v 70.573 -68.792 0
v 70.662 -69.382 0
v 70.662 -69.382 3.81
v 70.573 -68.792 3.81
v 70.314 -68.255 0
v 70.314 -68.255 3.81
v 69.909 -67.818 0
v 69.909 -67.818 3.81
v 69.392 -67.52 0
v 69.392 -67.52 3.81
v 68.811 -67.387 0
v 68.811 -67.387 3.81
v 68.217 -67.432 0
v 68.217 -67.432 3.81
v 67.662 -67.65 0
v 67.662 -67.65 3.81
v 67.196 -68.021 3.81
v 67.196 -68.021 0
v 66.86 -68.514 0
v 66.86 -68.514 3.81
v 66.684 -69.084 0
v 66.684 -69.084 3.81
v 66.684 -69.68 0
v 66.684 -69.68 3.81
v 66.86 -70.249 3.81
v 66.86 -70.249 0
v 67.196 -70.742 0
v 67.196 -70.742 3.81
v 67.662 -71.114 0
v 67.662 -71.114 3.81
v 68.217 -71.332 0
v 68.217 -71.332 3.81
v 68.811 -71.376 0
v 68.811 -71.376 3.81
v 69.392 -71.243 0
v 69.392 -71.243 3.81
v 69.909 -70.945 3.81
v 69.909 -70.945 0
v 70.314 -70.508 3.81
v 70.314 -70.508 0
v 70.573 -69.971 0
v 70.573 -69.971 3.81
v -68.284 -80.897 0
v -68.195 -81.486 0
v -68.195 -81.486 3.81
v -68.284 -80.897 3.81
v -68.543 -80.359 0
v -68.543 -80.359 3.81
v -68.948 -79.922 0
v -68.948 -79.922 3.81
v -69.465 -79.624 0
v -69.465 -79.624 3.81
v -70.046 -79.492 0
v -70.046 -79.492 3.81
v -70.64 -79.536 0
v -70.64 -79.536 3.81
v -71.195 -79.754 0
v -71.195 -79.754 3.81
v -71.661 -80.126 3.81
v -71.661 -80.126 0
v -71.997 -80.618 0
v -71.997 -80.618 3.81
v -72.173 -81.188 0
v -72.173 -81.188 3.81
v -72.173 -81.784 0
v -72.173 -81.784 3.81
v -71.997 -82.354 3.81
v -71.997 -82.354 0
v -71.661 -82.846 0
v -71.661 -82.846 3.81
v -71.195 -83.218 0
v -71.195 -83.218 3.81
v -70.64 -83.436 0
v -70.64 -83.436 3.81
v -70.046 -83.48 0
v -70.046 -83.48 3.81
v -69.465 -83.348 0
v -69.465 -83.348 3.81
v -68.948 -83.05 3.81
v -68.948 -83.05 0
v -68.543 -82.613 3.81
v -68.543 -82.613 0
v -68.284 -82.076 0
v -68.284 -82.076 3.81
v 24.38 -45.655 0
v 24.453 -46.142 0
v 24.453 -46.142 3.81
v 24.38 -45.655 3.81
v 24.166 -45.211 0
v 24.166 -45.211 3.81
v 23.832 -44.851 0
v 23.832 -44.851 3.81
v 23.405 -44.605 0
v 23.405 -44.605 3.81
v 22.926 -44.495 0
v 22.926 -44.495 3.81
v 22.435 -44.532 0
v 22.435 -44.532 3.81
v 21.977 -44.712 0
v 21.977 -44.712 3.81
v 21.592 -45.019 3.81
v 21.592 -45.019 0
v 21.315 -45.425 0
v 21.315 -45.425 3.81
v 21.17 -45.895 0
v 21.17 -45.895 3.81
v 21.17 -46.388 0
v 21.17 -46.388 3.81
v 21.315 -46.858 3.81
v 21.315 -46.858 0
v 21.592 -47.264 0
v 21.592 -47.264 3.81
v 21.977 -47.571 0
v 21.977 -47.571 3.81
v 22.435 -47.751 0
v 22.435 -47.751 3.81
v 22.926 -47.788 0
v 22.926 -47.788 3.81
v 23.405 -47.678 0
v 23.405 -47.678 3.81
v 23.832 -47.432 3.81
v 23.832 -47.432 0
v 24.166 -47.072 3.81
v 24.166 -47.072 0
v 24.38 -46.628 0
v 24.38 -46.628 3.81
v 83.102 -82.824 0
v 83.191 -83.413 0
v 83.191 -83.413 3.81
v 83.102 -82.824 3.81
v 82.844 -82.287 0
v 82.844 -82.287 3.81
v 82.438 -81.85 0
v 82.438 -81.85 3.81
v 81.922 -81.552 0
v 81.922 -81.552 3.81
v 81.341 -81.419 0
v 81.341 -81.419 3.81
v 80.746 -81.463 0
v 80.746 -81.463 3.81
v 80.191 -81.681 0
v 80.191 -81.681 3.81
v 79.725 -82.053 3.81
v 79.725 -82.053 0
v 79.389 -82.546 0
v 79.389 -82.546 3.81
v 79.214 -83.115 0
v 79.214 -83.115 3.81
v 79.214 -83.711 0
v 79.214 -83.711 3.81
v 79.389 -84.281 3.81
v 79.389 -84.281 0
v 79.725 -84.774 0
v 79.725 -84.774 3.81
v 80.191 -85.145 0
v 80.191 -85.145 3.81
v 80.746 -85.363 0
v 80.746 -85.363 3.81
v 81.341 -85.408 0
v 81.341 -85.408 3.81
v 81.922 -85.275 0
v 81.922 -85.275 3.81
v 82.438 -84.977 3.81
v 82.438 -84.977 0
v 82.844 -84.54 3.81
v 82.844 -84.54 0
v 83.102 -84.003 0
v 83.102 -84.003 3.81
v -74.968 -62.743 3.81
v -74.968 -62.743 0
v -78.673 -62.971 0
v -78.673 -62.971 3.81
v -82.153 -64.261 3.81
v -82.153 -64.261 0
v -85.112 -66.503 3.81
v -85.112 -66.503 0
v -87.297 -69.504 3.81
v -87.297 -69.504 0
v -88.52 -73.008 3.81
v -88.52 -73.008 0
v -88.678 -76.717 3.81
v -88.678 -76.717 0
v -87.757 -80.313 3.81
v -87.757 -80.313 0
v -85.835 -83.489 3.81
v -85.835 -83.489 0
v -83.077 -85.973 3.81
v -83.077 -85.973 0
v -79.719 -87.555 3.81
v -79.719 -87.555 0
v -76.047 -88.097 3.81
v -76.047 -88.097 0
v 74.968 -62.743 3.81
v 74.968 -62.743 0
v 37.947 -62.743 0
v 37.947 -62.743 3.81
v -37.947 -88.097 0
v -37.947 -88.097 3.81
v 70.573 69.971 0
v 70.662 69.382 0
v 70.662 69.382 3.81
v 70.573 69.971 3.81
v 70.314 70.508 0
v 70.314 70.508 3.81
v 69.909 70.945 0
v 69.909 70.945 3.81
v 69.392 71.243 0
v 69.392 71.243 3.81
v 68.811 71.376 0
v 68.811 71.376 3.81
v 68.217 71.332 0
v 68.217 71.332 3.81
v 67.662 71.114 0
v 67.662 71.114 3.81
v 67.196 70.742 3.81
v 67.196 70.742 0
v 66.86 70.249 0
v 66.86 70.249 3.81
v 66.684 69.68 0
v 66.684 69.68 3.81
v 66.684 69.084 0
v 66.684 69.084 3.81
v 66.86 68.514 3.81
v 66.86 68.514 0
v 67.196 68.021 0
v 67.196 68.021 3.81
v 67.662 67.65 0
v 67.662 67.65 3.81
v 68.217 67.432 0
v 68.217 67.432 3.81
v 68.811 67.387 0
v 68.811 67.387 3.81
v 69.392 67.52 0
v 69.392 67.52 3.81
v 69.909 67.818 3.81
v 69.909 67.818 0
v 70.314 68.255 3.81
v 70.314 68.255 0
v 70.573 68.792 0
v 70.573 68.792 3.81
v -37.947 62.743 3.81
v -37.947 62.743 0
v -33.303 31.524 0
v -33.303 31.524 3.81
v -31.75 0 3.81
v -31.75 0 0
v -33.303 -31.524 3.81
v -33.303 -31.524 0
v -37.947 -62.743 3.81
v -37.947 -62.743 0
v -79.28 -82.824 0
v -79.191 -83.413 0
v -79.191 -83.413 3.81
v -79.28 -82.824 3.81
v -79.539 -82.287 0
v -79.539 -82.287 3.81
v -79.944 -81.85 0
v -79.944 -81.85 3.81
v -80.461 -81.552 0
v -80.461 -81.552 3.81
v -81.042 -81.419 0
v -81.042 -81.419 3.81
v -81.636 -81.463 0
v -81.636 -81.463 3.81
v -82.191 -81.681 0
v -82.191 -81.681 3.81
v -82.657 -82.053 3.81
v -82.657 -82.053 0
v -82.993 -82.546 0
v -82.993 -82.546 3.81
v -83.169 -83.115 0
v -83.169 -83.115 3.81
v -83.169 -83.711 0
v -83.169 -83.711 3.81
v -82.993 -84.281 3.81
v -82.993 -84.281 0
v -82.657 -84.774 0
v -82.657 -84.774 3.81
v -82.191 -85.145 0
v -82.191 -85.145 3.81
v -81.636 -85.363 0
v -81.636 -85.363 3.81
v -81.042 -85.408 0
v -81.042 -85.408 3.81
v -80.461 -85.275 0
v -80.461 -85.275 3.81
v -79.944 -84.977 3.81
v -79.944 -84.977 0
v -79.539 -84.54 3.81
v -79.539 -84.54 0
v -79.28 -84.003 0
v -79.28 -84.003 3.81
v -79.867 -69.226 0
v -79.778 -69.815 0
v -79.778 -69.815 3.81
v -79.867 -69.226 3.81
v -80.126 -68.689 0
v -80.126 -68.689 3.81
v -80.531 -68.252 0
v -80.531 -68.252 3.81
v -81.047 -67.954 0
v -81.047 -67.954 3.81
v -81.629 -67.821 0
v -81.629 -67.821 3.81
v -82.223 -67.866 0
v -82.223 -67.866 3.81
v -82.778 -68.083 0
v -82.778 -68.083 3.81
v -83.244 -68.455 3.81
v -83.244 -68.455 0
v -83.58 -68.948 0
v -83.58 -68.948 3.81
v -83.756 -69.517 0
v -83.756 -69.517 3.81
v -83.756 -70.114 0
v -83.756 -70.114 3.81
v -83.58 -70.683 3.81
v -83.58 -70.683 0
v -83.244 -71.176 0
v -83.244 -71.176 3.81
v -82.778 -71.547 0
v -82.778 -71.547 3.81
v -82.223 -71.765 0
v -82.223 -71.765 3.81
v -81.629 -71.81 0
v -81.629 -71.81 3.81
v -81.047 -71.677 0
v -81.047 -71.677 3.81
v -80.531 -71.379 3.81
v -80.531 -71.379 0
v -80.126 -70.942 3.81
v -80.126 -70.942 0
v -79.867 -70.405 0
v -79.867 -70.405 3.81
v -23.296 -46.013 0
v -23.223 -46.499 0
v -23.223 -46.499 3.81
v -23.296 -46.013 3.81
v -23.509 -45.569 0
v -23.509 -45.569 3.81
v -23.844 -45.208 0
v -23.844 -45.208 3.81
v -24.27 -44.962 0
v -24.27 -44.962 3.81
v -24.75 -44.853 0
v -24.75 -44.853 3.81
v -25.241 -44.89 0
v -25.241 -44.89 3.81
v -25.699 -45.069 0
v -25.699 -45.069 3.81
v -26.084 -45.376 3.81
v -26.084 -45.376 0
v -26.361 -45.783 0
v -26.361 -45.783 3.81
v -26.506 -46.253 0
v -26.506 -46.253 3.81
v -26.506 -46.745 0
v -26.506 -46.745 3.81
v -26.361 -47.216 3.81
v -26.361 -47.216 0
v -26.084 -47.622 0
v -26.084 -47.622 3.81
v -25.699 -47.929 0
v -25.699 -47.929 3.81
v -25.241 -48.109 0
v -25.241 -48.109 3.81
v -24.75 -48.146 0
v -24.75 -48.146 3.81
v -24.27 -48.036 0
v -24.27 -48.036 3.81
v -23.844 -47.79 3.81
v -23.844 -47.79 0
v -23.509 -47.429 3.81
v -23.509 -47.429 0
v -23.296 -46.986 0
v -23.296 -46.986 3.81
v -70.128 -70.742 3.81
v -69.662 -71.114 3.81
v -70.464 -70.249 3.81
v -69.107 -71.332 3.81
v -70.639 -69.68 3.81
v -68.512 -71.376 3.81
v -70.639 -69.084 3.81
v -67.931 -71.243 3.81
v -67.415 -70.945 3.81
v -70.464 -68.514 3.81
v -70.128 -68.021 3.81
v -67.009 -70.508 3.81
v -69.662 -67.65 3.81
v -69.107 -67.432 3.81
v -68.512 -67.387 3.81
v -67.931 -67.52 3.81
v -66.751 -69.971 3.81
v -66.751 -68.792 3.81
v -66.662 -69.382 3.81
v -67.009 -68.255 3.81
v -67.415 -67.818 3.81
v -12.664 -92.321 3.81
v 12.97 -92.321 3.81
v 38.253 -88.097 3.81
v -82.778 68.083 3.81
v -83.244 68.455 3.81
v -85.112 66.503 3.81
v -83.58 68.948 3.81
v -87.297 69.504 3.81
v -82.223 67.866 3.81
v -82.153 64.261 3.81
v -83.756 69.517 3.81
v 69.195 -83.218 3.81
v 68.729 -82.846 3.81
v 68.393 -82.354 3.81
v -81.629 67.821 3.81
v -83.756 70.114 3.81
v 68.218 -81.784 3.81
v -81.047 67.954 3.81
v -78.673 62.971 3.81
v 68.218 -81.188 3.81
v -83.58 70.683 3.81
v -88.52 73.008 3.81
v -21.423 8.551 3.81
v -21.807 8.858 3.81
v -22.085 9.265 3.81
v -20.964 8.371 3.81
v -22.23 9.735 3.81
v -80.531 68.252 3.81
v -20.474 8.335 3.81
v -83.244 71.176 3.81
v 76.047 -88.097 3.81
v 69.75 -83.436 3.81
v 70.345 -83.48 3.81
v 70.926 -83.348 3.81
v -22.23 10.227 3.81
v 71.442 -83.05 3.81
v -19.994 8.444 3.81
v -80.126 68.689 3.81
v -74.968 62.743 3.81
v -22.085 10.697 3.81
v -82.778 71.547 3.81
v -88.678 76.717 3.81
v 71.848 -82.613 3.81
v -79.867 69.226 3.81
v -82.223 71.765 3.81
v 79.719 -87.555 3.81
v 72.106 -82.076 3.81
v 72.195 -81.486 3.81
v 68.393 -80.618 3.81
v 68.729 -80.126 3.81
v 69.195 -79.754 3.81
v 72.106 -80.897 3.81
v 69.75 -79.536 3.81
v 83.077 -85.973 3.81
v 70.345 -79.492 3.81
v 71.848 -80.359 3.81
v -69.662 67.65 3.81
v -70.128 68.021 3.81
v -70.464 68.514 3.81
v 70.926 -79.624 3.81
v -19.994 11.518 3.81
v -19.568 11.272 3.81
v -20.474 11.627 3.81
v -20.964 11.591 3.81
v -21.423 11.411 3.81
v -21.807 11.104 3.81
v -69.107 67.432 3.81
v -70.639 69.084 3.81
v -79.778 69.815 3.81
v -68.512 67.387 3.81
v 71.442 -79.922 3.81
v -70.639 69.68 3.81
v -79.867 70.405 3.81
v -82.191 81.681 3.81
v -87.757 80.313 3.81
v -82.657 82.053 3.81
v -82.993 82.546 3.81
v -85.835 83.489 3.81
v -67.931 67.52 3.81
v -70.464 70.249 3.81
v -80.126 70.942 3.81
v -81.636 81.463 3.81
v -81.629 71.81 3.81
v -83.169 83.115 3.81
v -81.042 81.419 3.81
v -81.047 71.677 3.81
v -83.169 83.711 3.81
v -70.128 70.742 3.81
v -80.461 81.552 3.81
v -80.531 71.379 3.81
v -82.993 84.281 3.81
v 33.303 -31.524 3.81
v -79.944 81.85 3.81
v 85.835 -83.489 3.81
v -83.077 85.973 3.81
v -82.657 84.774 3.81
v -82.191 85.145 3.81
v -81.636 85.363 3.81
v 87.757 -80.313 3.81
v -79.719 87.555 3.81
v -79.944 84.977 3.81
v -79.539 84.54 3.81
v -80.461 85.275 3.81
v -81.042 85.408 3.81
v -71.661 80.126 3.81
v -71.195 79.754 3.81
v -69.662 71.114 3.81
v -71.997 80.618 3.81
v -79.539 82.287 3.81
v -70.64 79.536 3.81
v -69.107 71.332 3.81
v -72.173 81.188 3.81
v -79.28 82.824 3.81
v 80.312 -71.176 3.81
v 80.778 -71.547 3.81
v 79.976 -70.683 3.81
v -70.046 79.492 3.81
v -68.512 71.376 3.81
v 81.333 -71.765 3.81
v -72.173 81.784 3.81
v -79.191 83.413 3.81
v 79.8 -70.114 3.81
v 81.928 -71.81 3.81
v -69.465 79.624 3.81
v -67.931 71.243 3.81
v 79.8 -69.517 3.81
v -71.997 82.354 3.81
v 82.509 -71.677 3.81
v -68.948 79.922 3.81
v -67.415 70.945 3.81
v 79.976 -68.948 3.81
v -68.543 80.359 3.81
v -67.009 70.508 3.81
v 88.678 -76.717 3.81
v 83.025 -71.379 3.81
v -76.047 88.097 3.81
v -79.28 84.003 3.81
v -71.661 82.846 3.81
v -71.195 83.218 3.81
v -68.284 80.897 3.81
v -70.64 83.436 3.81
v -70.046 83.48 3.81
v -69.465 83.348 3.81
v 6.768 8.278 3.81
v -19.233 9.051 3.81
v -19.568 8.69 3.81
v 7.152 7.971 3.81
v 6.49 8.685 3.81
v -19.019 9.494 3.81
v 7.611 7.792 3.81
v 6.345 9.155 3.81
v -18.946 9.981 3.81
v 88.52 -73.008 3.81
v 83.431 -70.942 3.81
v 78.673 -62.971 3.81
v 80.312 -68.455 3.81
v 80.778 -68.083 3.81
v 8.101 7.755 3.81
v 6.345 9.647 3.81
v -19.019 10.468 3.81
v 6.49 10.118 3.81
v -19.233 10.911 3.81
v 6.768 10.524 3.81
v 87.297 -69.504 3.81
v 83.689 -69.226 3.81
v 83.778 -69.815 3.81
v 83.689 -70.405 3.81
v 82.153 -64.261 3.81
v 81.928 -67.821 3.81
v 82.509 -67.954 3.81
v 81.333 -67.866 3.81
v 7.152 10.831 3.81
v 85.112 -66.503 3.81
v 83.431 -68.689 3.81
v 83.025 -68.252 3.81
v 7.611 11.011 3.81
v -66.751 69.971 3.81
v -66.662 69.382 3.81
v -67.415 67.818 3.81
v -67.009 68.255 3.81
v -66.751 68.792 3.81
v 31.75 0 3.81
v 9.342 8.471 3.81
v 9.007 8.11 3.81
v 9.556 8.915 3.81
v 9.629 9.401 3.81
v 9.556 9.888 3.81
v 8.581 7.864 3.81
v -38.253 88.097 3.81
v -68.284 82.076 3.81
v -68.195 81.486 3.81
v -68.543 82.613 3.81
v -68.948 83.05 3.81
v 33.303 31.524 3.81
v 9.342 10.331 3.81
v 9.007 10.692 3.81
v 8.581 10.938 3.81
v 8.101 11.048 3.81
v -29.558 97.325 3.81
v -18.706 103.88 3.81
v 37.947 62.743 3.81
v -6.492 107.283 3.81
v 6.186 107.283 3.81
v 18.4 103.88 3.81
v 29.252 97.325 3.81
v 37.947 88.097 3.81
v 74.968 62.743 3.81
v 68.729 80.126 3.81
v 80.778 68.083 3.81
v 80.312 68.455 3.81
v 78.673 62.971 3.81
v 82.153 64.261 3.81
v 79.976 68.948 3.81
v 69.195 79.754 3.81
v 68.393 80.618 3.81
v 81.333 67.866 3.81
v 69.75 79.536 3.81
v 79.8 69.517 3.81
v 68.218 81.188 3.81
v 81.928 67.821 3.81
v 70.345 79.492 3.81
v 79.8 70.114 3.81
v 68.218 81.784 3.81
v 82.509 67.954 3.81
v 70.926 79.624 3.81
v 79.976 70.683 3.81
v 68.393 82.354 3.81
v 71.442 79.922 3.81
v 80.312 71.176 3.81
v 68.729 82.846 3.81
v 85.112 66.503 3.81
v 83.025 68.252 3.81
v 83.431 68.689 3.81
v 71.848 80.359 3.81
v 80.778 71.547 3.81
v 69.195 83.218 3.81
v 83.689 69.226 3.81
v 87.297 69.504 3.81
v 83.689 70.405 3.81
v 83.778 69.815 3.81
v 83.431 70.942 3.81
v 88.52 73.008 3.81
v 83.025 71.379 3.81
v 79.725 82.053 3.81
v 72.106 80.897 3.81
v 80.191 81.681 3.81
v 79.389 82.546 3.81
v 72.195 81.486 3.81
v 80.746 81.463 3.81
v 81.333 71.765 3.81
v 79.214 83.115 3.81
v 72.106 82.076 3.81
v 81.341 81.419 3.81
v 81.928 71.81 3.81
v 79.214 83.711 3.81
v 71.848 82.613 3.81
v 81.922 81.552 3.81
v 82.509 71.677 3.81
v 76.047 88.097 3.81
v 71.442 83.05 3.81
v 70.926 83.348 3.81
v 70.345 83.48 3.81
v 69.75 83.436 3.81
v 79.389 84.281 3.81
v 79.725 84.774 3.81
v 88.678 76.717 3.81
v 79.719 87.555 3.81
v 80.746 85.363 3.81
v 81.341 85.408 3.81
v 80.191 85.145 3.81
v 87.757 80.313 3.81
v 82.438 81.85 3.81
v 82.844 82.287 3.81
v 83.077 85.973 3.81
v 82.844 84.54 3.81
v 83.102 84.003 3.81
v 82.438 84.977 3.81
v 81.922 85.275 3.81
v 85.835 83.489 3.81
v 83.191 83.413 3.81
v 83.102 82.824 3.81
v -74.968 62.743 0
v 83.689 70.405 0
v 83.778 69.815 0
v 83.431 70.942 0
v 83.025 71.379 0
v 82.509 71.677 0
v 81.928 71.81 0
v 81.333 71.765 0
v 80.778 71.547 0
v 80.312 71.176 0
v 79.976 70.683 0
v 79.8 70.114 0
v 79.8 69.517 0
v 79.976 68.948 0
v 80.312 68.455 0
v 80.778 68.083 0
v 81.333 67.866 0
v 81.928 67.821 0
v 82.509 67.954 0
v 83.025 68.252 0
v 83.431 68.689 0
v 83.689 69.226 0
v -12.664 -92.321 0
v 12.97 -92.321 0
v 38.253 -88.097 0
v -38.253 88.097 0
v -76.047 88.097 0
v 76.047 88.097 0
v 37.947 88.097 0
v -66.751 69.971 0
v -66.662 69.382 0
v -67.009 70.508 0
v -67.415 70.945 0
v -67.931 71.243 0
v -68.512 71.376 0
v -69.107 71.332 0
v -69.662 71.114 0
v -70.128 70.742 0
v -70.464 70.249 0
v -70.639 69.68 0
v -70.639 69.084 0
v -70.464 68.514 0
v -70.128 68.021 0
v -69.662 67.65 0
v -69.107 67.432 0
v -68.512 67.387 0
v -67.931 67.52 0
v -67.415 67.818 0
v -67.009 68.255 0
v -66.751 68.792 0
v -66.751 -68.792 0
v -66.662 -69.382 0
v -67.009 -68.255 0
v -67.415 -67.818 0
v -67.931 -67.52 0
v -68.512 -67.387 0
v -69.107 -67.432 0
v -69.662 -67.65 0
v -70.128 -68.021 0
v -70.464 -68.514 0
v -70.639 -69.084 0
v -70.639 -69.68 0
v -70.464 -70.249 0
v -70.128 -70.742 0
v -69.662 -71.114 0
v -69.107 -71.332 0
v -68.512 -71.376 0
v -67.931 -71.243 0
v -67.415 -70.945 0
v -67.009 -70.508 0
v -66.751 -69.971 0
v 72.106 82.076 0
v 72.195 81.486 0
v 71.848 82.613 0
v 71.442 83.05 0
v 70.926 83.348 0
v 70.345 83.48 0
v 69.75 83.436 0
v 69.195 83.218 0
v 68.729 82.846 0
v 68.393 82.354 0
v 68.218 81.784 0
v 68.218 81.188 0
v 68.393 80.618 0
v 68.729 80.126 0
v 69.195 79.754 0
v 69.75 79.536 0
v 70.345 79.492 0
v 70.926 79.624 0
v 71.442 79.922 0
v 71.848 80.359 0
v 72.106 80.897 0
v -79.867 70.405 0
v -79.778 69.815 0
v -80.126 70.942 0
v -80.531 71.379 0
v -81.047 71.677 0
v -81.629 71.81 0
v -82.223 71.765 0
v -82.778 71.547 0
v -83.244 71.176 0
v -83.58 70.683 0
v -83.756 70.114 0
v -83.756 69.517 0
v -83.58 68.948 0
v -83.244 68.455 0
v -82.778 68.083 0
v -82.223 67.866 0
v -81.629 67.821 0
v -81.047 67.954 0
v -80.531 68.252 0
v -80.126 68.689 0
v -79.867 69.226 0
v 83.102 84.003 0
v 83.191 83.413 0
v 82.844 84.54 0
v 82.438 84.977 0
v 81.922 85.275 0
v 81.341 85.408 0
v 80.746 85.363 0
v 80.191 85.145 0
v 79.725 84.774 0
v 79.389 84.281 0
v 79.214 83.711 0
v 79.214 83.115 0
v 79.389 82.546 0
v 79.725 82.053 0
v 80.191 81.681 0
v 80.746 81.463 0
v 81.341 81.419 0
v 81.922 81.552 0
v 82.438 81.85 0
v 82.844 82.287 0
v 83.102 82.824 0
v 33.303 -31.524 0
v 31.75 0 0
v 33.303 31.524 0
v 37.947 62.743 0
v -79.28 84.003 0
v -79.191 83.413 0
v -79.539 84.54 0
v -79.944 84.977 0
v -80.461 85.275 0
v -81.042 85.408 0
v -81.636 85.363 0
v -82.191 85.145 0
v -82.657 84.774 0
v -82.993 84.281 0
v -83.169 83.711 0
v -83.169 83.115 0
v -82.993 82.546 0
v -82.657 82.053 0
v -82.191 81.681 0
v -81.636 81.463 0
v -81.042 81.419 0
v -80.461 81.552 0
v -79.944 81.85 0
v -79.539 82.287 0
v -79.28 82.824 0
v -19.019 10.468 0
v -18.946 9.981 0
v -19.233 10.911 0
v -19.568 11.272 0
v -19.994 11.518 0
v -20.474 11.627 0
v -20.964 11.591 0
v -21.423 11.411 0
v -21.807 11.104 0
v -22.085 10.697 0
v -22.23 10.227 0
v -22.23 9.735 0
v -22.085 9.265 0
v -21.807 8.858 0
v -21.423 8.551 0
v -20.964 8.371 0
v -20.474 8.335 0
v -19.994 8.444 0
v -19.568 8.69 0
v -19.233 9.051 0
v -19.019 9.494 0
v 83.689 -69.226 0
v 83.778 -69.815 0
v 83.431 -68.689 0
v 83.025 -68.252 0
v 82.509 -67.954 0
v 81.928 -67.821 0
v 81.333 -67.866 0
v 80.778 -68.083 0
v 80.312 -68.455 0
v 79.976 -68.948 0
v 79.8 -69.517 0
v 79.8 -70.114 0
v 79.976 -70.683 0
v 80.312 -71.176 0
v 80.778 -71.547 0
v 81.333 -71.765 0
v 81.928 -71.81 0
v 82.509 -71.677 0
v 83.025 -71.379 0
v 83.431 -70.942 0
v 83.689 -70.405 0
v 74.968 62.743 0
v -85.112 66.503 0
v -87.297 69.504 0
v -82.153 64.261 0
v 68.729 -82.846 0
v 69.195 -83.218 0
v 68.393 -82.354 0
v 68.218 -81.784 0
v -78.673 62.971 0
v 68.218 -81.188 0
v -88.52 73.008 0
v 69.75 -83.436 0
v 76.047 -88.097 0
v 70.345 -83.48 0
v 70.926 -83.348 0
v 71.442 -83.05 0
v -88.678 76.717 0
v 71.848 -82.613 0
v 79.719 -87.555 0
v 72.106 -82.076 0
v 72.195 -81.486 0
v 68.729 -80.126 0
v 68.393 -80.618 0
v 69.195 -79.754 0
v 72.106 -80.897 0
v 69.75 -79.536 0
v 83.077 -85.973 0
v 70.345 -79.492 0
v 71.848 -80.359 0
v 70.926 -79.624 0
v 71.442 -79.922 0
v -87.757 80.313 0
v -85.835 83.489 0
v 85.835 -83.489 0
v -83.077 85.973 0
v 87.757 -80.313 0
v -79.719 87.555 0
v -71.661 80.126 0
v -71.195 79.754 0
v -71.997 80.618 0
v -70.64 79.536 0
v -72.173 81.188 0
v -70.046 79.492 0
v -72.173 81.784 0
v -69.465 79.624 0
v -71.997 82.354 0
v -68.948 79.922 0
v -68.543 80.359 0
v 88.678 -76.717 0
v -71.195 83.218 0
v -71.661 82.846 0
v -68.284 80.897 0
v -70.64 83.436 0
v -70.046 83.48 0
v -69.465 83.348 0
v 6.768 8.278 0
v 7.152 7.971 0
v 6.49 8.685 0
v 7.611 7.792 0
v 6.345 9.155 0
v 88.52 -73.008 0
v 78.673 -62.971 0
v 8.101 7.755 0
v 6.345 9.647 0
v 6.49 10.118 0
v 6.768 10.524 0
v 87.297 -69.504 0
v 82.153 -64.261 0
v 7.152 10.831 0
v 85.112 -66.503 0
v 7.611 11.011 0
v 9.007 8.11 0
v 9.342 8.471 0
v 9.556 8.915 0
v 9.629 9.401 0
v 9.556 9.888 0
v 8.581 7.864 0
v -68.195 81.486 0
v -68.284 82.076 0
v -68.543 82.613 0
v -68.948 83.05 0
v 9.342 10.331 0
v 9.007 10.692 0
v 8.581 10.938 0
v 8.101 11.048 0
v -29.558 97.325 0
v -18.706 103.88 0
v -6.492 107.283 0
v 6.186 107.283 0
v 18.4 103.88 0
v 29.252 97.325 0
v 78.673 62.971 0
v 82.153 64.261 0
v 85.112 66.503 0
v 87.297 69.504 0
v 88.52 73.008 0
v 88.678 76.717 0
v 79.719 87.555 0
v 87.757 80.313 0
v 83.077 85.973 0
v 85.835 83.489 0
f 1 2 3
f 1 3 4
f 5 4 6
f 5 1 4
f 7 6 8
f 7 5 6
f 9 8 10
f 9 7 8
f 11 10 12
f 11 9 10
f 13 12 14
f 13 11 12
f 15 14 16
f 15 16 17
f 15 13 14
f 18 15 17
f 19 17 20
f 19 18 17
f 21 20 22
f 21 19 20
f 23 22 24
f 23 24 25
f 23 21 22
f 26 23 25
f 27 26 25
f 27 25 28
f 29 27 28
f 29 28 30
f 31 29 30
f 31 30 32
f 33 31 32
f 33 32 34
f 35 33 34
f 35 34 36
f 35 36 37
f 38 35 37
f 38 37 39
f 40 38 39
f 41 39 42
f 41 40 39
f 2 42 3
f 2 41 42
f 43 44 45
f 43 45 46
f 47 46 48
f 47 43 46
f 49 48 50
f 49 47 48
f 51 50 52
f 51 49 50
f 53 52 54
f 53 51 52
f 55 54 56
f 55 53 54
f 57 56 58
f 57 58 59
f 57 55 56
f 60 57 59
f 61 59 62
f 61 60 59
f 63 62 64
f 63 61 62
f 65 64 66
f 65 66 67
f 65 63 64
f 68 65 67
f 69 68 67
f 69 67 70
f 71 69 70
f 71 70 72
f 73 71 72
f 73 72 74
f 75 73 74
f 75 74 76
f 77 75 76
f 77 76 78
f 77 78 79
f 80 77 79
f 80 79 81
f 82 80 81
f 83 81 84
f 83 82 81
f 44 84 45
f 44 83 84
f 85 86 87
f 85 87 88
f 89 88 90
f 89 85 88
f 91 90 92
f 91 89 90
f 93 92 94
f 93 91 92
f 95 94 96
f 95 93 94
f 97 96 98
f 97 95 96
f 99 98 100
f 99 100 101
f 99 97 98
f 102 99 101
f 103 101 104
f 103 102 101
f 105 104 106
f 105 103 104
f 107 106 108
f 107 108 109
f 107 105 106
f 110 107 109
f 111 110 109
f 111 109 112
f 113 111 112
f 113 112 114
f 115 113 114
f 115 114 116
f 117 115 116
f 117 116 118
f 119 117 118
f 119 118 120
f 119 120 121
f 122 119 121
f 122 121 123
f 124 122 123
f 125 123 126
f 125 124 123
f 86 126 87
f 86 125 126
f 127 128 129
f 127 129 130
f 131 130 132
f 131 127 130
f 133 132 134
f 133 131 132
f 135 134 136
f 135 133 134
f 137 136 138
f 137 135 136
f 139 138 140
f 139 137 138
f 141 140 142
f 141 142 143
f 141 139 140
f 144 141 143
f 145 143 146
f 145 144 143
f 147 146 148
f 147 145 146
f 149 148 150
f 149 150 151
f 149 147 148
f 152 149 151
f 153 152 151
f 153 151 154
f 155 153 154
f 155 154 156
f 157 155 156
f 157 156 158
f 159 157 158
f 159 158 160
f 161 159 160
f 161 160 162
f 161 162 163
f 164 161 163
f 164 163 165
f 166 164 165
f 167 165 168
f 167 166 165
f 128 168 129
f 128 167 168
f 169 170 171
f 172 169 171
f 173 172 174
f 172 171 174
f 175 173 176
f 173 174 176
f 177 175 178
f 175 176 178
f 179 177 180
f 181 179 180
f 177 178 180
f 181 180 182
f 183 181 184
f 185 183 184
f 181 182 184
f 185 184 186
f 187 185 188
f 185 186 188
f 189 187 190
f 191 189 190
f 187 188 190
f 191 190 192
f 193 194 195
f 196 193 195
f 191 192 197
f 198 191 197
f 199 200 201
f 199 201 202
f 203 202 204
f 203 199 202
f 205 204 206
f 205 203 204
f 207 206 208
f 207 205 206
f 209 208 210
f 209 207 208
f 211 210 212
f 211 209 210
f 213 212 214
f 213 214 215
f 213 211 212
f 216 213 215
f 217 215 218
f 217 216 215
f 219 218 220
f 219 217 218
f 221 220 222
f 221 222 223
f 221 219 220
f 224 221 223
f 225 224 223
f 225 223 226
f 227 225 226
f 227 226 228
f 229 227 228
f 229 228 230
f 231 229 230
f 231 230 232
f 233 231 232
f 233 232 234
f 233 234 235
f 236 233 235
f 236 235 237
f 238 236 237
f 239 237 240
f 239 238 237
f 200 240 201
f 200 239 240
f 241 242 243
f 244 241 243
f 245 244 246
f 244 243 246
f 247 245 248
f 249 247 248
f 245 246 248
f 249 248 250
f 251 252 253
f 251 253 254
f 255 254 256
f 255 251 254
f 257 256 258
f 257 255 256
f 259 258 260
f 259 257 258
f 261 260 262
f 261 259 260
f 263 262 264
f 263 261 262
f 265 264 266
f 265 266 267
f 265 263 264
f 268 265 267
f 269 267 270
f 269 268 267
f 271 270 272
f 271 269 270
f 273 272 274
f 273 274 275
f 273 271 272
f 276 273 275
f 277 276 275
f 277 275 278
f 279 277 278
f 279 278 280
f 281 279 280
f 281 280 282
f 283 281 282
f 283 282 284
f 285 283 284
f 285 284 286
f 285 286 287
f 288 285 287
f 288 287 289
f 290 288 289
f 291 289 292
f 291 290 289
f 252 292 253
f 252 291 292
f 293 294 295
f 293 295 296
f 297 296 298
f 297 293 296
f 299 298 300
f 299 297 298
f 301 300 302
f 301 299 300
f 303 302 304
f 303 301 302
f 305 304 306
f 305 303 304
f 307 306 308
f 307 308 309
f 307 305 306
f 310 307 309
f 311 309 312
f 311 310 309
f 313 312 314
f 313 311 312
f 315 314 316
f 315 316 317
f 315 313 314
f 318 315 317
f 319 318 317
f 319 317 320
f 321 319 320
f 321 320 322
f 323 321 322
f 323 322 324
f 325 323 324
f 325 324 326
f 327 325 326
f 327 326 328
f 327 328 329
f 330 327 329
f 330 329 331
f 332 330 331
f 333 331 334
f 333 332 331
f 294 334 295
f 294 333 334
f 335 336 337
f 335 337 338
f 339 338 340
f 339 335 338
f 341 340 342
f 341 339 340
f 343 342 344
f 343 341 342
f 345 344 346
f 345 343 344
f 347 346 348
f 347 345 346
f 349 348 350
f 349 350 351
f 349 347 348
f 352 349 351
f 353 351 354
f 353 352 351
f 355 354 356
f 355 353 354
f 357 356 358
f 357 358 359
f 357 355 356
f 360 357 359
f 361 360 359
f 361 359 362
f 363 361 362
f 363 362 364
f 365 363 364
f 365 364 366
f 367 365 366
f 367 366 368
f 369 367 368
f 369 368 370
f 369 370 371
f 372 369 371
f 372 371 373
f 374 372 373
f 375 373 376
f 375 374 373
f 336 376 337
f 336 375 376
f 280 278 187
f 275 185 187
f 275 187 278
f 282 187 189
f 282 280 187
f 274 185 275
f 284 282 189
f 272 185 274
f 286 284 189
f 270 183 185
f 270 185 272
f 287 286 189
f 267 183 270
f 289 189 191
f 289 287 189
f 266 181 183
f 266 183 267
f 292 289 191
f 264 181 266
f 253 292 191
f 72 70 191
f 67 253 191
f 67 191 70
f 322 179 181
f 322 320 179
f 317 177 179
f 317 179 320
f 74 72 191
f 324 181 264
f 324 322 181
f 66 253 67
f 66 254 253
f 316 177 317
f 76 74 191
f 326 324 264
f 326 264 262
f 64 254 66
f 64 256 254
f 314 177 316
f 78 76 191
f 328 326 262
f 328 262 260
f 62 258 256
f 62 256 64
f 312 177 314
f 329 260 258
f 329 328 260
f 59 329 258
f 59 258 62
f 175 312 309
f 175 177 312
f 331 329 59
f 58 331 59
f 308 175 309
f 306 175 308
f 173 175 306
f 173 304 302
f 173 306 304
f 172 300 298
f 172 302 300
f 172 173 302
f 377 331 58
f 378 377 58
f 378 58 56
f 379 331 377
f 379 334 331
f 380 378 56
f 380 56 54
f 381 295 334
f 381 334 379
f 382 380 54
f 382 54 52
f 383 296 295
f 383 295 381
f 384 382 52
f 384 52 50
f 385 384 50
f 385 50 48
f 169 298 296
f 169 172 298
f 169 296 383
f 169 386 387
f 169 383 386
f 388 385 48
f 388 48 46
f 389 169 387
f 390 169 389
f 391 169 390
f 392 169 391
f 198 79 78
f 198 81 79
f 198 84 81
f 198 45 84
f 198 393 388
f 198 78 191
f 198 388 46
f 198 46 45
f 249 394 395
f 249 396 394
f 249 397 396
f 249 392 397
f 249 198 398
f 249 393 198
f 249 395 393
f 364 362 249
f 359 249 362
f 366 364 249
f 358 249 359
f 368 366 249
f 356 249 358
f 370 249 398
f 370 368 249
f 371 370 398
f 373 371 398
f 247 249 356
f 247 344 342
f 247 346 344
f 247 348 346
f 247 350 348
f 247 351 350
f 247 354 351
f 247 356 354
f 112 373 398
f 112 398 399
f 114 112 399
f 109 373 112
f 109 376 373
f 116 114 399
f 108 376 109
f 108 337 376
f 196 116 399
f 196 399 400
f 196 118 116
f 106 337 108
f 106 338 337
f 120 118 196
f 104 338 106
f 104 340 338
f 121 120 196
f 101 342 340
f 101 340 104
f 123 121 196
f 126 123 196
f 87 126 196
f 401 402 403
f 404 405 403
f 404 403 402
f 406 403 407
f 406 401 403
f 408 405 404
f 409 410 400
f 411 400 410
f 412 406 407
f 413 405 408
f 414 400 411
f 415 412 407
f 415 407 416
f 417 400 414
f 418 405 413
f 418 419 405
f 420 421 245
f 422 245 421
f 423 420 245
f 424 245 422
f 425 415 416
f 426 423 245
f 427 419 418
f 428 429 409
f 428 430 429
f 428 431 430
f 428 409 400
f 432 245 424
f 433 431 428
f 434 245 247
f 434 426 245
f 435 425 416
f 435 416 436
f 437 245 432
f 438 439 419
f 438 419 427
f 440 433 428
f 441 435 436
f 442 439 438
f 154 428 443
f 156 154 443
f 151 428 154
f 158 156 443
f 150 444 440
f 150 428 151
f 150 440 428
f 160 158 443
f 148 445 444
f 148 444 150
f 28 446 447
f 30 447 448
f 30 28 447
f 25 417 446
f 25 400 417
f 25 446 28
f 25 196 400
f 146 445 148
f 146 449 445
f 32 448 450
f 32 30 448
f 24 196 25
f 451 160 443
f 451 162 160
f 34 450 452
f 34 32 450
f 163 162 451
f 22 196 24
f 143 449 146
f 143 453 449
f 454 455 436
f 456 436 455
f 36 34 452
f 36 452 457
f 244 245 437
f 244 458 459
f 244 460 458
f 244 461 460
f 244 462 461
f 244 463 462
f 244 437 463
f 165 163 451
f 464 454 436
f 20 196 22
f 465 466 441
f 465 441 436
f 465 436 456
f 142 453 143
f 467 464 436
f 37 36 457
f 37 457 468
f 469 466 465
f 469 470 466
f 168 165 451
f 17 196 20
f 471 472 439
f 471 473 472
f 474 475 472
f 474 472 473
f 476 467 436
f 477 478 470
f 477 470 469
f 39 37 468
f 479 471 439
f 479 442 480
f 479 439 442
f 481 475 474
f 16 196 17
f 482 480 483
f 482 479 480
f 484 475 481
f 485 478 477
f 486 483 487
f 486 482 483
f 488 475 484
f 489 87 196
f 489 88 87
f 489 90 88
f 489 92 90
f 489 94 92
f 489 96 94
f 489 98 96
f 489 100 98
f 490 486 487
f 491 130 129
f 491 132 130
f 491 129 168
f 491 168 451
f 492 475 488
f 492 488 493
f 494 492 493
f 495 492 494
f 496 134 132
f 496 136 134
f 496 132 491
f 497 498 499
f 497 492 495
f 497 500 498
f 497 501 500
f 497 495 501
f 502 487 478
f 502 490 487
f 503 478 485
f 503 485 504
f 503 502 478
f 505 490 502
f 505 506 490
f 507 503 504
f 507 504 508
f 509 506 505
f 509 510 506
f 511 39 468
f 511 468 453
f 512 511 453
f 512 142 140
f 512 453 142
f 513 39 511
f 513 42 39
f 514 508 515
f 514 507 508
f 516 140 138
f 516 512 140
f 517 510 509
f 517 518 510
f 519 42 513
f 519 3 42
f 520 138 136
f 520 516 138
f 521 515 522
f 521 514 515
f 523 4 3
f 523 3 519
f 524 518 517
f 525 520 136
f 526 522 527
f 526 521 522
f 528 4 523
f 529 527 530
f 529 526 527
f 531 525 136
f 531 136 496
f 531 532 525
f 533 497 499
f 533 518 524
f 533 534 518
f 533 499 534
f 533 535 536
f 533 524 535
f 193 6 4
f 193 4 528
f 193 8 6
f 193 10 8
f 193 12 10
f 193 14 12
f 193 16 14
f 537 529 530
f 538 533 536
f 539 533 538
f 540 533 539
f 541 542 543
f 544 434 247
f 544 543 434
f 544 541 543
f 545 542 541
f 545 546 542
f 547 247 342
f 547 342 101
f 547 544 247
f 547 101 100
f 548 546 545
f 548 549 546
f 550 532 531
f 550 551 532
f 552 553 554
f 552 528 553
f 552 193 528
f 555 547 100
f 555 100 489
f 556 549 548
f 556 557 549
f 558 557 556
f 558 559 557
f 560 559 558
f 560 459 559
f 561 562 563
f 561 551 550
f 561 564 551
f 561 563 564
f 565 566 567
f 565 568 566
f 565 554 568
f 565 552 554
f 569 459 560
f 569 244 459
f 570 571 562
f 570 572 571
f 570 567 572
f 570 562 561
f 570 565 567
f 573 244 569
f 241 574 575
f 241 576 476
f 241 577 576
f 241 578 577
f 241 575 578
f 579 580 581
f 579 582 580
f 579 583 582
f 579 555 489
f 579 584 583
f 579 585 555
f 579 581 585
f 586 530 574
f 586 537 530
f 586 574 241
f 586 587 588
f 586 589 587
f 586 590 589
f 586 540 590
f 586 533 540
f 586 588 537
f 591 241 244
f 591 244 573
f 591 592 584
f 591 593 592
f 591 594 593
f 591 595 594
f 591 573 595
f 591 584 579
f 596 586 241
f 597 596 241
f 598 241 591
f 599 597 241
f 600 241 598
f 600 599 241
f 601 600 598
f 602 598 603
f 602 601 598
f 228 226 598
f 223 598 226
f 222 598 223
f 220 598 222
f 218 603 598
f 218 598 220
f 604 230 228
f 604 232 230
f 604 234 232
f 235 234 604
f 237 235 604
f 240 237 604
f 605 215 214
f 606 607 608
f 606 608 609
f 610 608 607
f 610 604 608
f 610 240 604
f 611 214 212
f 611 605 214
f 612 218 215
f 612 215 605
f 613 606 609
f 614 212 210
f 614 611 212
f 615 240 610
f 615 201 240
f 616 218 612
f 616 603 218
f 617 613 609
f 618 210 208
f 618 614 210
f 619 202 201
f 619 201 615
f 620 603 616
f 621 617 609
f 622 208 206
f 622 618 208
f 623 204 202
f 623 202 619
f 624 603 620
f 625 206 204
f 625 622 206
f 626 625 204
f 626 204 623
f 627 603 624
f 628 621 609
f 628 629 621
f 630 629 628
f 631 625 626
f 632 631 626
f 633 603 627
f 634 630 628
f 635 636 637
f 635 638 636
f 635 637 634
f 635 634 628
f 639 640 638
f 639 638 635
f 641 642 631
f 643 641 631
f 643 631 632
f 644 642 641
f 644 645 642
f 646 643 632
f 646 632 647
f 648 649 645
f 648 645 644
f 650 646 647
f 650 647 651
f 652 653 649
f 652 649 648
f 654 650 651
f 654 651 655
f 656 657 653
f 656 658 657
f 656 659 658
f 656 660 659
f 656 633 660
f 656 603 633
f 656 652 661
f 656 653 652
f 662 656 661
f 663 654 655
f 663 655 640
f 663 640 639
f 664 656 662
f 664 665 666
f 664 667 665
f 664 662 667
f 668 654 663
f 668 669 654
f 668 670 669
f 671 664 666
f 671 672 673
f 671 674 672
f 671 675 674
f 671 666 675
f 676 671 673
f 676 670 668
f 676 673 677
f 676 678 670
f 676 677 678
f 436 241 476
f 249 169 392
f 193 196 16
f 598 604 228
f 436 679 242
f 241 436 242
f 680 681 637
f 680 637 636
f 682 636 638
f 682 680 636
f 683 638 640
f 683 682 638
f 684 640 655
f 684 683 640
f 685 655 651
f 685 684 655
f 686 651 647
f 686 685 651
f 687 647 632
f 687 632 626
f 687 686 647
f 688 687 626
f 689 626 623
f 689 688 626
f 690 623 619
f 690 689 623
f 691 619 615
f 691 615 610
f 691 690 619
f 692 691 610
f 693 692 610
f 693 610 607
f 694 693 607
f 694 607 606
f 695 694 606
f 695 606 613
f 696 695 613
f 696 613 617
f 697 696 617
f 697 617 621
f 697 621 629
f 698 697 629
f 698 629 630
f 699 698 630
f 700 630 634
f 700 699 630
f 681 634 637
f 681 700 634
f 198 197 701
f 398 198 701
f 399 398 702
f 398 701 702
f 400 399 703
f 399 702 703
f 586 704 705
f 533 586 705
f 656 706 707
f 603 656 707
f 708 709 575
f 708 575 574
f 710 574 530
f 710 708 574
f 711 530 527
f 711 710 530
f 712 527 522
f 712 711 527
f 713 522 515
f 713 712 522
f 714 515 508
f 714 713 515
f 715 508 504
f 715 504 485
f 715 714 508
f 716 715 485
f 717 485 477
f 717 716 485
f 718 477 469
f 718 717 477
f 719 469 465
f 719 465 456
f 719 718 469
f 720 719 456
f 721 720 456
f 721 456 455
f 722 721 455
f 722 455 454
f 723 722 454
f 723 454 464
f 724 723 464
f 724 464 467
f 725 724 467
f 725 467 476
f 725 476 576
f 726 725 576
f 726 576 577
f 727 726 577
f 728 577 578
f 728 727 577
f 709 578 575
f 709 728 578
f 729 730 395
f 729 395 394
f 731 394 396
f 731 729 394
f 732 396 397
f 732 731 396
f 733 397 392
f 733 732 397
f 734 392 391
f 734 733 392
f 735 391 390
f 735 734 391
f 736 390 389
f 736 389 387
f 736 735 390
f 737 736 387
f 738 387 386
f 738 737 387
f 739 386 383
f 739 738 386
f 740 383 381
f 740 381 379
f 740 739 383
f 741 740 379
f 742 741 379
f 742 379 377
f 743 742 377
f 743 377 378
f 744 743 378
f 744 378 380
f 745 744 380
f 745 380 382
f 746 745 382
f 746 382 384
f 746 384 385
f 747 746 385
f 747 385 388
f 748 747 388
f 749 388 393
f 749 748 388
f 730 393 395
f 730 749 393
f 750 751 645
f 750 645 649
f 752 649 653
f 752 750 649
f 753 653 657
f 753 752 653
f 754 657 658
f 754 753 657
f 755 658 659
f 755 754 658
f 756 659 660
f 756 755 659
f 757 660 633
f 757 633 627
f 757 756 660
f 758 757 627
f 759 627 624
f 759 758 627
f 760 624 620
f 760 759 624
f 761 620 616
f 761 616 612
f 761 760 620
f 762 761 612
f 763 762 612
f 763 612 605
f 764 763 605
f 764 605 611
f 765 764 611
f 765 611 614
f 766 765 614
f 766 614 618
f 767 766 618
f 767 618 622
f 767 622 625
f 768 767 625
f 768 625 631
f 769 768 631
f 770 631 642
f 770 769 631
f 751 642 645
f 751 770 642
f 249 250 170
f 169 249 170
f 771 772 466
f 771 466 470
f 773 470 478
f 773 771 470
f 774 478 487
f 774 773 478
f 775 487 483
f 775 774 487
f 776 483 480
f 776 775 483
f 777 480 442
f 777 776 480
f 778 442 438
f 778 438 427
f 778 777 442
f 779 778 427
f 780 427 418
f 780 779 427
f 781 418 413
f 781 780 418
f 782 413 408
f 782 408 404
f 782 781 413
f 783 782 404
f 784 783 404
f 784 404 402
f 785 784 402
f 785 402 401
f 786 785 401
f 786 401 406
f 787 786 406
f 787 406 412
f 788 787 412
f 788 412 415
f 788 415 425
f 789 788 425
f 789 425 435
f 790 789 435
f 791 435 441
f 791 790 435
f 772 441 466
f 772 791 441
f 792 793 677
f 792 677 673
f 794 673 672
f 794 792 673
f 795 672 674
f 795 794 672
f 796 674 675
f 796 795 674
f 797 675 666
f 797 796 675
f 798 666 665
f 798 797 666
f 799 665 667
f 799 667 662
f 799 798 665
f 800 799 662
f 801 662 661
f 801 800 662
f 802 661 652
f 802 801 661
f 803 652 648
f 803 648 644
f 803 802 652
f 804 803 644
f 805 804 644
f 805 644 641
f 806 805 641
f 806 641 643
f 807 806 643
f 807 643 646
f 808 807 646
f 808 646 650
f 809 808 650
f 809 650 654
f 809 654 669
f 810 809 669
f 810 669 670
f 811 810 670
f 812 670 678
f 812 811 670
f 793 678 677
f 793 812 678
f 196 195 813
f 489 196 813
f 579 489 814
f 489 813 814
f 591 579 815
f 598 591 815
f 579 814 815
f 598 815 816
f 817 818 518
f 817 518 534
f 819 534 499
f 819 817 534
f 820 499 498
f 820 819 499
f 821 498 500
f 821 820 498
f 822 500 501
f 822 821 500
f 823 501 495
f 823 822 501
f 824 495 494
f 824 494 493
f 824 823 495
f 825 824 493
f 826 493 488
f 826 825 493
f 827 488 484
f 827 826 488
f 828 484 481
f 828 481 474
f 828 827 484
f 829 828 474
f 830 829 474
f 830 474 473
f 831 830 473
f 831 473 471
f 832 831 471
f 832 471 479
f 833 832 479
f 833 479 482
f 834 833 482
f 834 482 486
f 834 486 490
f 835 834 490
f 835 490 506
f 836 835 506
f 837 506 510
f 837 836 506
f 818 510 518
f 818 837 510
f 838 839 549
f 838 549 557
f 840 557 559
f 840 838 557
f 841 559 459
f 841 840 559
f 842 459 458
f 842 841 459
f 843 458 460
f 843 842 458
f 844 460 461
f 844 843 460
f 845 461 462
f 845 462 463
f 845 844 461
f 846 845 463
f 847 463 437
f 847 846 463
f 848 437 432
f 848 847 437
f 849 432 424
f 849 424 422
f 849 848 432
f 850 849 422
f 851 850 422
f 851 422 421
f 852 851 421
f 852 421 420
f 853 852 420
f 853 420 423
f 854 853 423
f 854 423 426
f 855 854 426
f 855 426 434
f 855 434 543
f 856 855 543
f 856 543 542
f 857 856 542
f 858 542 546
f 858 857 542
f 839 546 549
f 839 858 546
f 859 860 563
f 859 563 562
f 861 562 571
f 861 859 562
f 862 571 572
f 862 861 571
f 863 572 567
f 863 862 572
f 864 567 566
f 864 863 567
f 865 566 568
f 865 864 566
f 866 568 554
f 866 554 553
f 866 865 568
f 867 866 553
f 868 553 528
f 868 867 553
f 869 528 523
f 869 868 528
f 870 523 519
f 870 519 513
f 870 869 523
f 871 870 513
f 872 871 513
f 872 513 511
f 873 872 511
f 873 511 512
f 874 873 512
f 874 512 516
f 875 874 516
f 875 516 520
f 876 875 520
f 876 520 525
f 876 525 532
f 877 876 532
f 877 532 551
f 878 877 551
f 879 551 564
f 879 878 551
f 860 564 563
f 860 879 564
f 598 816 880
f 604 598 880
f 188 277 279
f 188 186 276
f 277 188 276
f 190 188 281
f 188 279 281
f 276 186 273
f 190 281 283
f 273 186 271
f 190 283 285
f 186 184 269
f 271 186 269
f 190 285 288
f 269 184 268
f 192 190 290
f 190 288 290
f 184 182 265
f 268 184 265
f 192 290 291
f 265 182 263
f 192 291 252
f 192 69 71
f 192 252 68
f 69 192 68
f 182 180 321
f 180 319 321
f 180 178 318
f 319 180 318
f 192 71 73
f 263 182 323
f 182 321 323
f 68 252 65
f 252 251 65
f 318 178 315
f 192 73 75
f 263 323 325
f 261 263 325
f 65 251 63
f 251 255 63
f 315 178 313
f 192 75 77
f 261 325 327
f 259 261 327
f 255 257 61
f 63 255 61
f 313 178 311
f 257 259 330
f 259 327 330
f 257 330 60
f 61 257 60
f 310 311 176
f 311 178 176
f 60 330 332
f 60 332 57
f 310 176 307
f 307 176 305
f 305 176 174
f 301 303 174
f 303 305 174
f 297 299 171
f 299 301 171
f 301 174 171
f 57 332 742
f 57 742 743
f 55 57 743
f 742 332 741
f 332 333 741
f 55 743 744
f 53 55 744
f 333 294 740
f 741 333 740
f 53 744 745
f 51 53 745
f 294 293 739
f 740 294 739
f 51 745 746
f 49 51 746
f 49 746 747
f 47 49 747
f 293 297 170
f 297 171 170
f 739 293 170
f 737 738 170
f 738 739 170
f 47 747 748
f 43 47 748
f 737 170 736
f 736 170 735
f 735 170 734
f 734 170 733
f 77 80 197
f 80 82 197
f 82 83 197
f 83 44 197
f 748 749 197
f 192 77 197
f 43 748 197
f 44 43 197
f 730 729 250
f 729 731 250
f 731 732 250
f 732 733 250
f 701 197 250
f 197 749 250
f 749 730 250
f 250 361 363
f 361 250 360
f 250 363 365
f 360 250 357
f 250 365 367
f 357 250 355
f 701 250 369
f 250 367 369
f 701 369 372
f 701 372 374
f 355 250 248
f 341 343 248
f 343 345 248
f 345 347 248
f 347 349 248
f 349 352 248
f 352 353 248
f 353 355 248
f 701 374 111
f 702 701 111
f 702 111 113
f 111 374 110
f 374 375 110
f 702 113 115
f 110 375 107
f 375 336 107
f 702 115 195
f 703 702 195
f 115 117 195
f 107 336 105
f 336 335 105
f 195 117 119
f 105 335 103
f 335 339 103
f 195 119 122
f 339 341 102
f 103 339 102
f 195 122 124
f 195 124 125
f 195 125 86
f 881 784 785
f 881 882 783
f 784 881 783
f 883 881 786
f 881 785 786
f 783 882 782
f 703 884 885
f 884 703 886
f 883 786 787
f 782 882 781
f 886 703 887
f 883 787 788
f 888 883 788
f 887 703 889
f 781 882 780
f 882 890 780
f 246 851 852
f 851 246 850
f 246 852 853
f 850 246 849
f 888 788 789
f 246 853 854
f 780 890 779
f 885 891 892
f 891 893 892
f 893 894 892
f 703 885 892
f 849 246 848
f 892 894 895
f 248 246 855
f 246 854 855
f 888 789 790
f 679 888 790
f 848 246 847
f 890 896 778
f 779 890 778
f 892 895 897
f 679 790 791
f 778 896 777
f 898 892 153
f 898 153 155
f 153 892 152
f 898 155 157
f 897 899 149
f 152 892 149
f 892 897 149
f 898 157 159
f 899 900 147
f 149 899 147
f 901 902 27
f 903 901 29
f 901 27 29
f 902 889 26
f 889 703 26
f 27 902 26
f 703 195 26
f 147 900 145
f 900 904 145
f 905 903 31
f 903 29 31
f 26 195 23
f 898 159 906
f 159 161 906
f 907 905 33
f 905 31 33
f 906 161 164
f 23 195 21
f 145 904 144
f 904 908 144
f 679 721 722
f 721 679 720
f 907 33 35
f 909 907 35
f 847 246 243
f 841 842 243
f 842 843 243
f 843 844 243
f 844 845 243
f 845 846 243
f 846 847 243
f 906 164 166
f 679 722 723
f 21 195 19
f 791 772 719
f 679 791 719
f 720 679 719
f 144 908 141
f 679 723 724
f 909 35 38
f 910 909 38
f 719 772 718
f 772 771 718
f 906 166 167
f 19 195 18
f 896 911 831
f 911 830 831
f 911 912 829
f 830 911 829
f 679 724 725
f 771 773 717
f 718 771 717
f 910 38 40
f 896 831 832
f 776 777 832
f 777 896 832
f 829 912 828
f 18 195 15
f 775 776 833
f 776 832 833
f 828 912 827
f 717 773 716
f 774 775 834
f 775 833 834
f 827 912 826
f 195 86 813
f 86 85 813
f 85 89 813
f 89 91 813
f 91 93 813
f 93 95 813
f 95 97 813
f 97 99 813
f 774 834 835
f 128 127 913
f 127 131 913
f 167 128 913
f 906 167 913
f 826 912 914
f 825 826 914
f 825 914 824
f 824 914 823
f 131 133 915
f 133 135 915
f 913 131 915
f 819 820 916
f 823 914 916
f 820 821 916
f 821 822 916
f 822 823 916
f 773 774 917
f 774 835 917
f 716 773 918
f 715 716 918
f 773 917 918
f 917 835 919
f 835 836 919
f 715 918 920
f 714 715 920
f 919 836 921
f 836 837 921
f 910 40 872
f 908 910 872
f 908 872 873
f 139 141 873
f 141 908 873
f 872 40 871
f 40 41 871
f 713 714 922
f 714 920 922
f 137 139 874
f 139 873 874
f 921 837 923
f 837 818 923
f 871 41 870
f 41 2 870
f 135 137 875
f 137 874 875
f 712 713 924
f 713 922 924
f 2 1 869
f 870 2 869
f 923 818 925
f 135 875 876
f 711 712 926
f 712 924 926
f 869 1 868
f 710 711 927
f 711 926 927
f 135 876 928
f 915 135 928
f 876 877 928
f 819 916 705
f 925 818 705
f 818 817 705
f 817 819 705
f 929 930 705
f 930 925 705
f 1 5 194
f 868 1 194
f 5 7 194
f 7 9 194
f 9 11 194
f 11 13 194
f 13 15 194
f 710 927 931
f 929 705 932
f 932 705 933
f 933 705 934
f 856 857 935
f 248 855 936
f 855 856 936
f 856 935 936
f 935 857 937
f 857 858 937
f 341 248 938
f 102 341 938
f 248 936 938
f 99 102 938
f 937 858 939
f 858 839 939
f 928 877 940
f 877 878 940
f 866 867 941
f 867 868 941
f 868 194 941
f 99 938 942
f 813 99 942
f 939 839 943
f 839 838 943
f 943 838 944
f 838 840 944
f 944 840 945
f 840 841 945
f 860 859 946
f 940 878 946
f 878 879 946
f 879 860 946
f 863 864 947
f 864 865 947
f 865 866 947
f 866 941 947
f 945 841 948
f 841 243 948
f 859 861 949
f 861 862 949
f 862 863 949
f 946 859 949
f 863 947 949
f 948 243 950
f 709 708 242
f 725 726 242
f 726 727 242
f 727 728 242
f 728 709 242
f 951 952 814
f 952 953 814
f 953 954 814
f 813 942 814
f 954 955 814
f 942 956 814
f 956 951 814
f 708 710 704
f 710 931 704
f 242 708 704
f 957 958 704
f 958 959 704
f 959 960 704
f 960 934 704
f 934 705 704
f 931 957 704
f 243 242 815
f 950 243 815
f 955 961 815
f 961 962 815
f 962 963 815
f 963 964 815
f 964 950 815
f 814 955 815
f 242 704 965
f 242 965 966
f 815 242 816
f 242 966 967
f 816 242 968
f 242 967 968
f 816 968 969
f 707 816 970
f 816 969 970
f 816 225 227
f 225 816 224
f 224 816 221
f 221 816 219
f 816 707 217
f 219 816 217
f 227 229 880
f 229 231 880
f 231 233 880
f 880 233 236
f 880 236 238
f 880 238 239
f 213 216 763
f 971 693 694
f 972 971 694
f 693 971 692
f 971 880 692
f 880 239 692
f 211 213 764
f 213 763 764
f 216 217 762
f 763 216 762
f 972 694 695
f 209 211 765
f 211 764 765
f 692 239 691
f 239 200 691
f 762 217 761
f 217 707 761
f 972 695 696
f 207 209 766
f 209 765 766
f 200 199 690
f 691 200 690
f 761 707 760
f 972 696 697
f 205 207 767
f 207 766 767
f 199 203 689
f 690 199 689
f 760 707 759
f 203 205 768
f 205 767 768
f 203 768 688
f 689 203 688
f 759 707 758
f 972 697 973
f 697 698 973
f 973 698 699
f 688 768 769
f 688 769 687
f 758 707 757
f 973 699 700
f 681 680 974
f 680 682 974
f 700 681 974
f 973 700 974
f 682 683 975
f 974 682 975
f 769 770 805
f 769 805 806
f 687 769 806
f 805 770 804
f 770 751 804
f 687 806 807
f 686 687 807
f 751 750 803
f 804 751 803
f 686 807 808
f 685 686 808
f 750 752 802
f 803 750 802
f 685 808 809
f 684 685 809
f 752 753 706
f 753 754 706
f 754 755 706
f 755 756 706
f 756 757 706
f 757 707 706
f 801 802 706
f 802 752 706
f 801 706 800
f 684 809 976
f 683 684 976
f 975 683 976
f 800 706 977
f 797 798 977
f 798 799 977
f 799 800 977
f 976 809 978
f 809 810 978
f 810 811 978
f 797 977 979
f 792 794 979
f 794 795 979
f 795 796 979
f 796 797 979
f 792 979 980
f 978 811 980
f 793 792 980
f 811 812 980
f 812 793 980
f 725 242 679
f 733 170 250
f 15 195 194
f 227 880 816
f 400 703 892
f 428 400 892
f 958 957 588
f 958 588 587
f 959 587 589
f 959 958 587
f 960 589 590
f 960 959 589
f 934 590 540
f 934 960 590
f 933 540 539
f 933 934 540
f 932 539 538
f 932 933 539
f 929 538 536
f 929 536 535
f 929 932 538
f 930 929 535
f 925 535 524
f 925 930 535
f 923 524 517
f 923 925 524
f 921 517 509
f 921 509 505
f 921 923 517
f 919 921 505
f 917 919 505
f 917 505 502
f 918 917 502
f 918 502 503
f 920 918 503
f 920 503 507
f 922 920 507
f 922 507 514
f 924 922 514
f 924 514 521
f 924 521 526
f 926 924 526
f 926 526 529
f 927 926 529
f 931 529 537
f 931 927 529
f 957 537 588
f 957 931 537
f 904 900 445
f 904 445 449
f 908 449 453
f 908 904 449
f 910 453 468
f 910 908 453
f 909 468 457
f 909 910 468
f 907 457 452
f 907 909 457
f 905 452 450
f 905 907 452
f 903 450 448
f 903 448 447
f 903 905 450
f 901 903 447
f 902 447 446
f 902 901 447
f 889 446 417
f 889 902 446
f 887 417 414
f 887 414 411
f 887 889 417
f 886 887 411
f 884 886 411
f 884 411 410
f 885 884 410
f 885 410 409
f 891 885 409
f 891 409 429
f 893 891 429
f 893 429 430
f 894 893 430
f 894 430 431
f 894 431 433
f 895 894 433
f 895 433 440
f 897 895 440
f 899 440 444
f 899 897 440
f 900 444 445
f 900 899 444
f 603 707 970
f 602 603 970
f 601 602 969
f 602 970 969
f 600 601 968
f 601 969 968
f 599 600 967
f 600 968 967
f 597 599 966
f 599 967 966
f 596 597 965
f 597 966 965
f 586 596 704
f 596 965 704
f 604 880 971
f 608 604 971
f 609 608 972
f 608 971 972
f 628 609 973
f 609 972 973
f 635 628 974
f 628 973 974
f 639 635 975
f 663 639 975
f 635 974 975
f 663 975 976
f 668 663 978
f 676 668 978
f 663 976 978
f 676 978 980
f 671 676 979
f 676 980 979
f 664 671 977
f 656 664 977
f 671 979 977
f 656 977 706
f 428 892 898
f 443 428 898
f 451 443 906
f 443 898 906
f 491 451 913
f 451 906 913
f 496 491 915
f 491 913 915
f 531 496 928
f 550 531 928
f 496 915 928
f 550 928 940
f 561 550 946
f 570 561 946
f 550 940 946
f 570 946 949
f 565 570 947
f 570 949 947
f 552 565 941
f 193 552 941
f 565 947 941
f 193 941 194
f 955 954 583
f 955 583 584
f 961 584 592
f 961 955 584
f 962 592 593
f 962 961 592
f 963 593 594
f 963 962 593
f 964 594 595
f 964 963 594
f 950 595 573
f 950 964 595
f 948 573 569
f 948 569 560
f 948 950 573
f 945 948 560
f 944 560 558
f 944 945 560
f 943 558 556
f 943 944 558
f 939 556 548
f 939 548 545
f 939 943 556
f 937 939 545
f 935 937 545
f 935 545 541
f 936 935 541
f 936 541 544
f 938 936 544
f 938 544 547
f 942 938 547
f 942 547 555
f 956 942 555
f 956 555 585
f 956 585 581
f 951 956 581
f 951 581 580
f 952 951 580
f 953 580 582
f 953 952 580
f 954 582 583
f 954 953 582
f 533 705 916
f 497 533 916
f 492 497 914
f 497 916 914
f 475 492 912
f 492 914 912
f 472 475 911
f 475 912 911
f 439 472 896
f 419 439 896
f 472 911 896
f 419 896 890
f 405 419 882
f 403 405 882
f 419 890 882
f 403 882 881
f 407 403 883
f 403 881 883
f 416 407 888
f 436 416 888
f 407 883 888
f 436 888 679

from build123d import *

# Parameters (mm, degrees)
F0_R     = 2
F0_R_2   = 1.651
F1_DEPTH = 3.81


with BuildPart() as f1:
    # F0 (on Top) → F1 (new body)
    with BuildSketch(Plane.XY):
        with BuildLine():
            ThreePointArc((37.946905, 88.097033), (-0.153095, 107.714284), (-38.253095, 88.097033))
            Line((-38.253095, 88.097033), (-37.946905, 88.097033))
            Line((-37.946905, 88.097033), (37.946905, 88.097033))
        make_face()
        Polygon((-37.946905, 88.097033), (-38.253095, 88.097033), (-37.946905, 62.742965), (37.946905, 62.742965), (37.946905, 88.097033), align=None)
        with BuildLine():
            Line((-37.946905, 62.742965), (-38.253095, 88.097033))
            Line((-38.253095, 88.097033), (-76.046905, 88.097033))
            ThreePointArc((-76.046905, 88.097033), (-88.735417, 74.856974), (-74.967762, 62.742965))
            Line((-74.967762, 62.742965), (-37.946905, 62.742965))
        make_face()
        with Locations((-81.778049, 69.815444)):
            Circle(F0_R, mode=Mode.SUBTRACT)
        with Locations((-68.661721, 69.381662)):
            Circle(F0_R, mode=Mode.SUBTRACT)
        with Locations((-70.195213, 81.486084)):
            Circle(F0_R, mode=Mode.SUBTRACT)
        with Locations((-81.191262, 83.413343)):
            Circle(F0_R, mode=Mode.SUBTRACT)
        with BuildLine():
            Line((76.046905, 88.097033), (37.946905, 88.097033))
            Line((37.946905, 88.097033), (37.946905, 62.742965))
            Line((37.946905, 62.742965), (74.967762, 62.742965))
            ThreePointArc((74.967762, 62.742965), (88.735417, 74.856974), (76.046905, 88.097033))
        make_face()
        with Locations((68.661721, 69.381662)):
            Circle(F0_R, mode=Mode.SUBTRACT)
        with Locations((81.778049, 69.815444)):
            Circle(F0_R, mode=Mode.SUBTRACT)
        with Locations((70.195213, 81.486084)):
            Circle(F0_R, mode=Mode.SUBTRACT)
        with Locations((81.191262, 83.413343)):
            Circle(F0_R, mode=Mode.SUBTRACT)
        with BuildLine():
            Line((-37.946905, -88.097033), (-37.946905, -62.742965))
            Line((-37.946905, -62.742965), (-74.967762, -62.742965))
            ThreePointArc((-74.967762, -62.742965), (-88.735417, -74.856974), (-76.046905, -88.097033))
            Line((-76.046905, -88.097033), (-37.946905, -88.097033))
        make_face()
        with Locations((-81.191262, -83.413343)):
            Circle(F0_R, mode=Mode.SUBTRACT)
        with Locations((-70.195213, -81.486084)):
            Circle(F0_R, mode=Mode.SUBTRACT)
        with Locations((-81.778049, -69.815444)):
            Circle(F0_R, mode=Mode.SUBTRACT)
        with Locations((-68.661721, -69.381662)):
            Circle(F0_R, mode=Mode.SUBTRACT)
        with BuildLine():
            Line((74.967762, -62.742965), (37.946905, -62.742965))
            Line((37.946905, -62.742965), (38.253095, -88.097033))
            Line((38.253095, -88.097033), (76.046905, -88.097033))
            ThreePointArc((76.046905, -88.097033), (88.735417, -74.856974), (74.967762, -62.742965))
        make_face()
        with Locations((70.195213, -81.486084)):
            Circle(F0_R, mode=Mode.SUBTRACT)
        with Locations((81.191262, -83.413343)):
            Circle(F0_R, mode=Mode.SUBTRACT)
        with Locations((68.661721, -69.381662)):
            Circle(F0_R, mode=Mode.SUBTRACT)
        with Locations((81.778049, -69.815444)):
            Circle(F0_R, mode=Mode.SUBTRACT)
        Polygon((37.946905, -62.742965), (-37.946905, -62.742965), (-37.946905, -88.097033), (37.946905, -88.097033), (38.253095, -88.097033), align=None)
        with BuildLine():
            Line((37.946905, -88.097033), (-37.946905, -88.097033))
            ThreePointArc((-37.946905, -88.097033), (0.153095, -92.851298), (38.253095, -88.097033))
            Line((38.253095, -88.097033), (37.946905, -88.097033))
        make_face()
        with BuildLine():
            Line((37.946905, 62.742965), (-37.946905, 62.742965))
            ThreePointArc((-37.946905, 62.742965), (-31.75, 0), (-37.946905, -62.742965))
            Line((-37.946905, -62.742965), (37.946905, -62.742965))
            ThreePointArc((37.946905, -62.742965), (31.75, 0), (37.946905, 62.742965))
        make_face()
        with Locations((-24.873505, -46.499295)):
            Circle(F0_R_2, mode=Mode.SUBTRACT)
        with Locations((22.802295, -46.141523)):
            Circle(F0_R_2, mode=Mode.SUBTRACT)
        with Locations((-20.59705, 9.981038)):
            Circle(F0_R_2, mode=Mode.SUBTRACT)
        with Locations((7.97795, 9.401235)):
            Circle(F0_R_2, mode=Mode.SUBTRACT)
    extrude(amount=F1_DEPTH)


solid = f1.part
